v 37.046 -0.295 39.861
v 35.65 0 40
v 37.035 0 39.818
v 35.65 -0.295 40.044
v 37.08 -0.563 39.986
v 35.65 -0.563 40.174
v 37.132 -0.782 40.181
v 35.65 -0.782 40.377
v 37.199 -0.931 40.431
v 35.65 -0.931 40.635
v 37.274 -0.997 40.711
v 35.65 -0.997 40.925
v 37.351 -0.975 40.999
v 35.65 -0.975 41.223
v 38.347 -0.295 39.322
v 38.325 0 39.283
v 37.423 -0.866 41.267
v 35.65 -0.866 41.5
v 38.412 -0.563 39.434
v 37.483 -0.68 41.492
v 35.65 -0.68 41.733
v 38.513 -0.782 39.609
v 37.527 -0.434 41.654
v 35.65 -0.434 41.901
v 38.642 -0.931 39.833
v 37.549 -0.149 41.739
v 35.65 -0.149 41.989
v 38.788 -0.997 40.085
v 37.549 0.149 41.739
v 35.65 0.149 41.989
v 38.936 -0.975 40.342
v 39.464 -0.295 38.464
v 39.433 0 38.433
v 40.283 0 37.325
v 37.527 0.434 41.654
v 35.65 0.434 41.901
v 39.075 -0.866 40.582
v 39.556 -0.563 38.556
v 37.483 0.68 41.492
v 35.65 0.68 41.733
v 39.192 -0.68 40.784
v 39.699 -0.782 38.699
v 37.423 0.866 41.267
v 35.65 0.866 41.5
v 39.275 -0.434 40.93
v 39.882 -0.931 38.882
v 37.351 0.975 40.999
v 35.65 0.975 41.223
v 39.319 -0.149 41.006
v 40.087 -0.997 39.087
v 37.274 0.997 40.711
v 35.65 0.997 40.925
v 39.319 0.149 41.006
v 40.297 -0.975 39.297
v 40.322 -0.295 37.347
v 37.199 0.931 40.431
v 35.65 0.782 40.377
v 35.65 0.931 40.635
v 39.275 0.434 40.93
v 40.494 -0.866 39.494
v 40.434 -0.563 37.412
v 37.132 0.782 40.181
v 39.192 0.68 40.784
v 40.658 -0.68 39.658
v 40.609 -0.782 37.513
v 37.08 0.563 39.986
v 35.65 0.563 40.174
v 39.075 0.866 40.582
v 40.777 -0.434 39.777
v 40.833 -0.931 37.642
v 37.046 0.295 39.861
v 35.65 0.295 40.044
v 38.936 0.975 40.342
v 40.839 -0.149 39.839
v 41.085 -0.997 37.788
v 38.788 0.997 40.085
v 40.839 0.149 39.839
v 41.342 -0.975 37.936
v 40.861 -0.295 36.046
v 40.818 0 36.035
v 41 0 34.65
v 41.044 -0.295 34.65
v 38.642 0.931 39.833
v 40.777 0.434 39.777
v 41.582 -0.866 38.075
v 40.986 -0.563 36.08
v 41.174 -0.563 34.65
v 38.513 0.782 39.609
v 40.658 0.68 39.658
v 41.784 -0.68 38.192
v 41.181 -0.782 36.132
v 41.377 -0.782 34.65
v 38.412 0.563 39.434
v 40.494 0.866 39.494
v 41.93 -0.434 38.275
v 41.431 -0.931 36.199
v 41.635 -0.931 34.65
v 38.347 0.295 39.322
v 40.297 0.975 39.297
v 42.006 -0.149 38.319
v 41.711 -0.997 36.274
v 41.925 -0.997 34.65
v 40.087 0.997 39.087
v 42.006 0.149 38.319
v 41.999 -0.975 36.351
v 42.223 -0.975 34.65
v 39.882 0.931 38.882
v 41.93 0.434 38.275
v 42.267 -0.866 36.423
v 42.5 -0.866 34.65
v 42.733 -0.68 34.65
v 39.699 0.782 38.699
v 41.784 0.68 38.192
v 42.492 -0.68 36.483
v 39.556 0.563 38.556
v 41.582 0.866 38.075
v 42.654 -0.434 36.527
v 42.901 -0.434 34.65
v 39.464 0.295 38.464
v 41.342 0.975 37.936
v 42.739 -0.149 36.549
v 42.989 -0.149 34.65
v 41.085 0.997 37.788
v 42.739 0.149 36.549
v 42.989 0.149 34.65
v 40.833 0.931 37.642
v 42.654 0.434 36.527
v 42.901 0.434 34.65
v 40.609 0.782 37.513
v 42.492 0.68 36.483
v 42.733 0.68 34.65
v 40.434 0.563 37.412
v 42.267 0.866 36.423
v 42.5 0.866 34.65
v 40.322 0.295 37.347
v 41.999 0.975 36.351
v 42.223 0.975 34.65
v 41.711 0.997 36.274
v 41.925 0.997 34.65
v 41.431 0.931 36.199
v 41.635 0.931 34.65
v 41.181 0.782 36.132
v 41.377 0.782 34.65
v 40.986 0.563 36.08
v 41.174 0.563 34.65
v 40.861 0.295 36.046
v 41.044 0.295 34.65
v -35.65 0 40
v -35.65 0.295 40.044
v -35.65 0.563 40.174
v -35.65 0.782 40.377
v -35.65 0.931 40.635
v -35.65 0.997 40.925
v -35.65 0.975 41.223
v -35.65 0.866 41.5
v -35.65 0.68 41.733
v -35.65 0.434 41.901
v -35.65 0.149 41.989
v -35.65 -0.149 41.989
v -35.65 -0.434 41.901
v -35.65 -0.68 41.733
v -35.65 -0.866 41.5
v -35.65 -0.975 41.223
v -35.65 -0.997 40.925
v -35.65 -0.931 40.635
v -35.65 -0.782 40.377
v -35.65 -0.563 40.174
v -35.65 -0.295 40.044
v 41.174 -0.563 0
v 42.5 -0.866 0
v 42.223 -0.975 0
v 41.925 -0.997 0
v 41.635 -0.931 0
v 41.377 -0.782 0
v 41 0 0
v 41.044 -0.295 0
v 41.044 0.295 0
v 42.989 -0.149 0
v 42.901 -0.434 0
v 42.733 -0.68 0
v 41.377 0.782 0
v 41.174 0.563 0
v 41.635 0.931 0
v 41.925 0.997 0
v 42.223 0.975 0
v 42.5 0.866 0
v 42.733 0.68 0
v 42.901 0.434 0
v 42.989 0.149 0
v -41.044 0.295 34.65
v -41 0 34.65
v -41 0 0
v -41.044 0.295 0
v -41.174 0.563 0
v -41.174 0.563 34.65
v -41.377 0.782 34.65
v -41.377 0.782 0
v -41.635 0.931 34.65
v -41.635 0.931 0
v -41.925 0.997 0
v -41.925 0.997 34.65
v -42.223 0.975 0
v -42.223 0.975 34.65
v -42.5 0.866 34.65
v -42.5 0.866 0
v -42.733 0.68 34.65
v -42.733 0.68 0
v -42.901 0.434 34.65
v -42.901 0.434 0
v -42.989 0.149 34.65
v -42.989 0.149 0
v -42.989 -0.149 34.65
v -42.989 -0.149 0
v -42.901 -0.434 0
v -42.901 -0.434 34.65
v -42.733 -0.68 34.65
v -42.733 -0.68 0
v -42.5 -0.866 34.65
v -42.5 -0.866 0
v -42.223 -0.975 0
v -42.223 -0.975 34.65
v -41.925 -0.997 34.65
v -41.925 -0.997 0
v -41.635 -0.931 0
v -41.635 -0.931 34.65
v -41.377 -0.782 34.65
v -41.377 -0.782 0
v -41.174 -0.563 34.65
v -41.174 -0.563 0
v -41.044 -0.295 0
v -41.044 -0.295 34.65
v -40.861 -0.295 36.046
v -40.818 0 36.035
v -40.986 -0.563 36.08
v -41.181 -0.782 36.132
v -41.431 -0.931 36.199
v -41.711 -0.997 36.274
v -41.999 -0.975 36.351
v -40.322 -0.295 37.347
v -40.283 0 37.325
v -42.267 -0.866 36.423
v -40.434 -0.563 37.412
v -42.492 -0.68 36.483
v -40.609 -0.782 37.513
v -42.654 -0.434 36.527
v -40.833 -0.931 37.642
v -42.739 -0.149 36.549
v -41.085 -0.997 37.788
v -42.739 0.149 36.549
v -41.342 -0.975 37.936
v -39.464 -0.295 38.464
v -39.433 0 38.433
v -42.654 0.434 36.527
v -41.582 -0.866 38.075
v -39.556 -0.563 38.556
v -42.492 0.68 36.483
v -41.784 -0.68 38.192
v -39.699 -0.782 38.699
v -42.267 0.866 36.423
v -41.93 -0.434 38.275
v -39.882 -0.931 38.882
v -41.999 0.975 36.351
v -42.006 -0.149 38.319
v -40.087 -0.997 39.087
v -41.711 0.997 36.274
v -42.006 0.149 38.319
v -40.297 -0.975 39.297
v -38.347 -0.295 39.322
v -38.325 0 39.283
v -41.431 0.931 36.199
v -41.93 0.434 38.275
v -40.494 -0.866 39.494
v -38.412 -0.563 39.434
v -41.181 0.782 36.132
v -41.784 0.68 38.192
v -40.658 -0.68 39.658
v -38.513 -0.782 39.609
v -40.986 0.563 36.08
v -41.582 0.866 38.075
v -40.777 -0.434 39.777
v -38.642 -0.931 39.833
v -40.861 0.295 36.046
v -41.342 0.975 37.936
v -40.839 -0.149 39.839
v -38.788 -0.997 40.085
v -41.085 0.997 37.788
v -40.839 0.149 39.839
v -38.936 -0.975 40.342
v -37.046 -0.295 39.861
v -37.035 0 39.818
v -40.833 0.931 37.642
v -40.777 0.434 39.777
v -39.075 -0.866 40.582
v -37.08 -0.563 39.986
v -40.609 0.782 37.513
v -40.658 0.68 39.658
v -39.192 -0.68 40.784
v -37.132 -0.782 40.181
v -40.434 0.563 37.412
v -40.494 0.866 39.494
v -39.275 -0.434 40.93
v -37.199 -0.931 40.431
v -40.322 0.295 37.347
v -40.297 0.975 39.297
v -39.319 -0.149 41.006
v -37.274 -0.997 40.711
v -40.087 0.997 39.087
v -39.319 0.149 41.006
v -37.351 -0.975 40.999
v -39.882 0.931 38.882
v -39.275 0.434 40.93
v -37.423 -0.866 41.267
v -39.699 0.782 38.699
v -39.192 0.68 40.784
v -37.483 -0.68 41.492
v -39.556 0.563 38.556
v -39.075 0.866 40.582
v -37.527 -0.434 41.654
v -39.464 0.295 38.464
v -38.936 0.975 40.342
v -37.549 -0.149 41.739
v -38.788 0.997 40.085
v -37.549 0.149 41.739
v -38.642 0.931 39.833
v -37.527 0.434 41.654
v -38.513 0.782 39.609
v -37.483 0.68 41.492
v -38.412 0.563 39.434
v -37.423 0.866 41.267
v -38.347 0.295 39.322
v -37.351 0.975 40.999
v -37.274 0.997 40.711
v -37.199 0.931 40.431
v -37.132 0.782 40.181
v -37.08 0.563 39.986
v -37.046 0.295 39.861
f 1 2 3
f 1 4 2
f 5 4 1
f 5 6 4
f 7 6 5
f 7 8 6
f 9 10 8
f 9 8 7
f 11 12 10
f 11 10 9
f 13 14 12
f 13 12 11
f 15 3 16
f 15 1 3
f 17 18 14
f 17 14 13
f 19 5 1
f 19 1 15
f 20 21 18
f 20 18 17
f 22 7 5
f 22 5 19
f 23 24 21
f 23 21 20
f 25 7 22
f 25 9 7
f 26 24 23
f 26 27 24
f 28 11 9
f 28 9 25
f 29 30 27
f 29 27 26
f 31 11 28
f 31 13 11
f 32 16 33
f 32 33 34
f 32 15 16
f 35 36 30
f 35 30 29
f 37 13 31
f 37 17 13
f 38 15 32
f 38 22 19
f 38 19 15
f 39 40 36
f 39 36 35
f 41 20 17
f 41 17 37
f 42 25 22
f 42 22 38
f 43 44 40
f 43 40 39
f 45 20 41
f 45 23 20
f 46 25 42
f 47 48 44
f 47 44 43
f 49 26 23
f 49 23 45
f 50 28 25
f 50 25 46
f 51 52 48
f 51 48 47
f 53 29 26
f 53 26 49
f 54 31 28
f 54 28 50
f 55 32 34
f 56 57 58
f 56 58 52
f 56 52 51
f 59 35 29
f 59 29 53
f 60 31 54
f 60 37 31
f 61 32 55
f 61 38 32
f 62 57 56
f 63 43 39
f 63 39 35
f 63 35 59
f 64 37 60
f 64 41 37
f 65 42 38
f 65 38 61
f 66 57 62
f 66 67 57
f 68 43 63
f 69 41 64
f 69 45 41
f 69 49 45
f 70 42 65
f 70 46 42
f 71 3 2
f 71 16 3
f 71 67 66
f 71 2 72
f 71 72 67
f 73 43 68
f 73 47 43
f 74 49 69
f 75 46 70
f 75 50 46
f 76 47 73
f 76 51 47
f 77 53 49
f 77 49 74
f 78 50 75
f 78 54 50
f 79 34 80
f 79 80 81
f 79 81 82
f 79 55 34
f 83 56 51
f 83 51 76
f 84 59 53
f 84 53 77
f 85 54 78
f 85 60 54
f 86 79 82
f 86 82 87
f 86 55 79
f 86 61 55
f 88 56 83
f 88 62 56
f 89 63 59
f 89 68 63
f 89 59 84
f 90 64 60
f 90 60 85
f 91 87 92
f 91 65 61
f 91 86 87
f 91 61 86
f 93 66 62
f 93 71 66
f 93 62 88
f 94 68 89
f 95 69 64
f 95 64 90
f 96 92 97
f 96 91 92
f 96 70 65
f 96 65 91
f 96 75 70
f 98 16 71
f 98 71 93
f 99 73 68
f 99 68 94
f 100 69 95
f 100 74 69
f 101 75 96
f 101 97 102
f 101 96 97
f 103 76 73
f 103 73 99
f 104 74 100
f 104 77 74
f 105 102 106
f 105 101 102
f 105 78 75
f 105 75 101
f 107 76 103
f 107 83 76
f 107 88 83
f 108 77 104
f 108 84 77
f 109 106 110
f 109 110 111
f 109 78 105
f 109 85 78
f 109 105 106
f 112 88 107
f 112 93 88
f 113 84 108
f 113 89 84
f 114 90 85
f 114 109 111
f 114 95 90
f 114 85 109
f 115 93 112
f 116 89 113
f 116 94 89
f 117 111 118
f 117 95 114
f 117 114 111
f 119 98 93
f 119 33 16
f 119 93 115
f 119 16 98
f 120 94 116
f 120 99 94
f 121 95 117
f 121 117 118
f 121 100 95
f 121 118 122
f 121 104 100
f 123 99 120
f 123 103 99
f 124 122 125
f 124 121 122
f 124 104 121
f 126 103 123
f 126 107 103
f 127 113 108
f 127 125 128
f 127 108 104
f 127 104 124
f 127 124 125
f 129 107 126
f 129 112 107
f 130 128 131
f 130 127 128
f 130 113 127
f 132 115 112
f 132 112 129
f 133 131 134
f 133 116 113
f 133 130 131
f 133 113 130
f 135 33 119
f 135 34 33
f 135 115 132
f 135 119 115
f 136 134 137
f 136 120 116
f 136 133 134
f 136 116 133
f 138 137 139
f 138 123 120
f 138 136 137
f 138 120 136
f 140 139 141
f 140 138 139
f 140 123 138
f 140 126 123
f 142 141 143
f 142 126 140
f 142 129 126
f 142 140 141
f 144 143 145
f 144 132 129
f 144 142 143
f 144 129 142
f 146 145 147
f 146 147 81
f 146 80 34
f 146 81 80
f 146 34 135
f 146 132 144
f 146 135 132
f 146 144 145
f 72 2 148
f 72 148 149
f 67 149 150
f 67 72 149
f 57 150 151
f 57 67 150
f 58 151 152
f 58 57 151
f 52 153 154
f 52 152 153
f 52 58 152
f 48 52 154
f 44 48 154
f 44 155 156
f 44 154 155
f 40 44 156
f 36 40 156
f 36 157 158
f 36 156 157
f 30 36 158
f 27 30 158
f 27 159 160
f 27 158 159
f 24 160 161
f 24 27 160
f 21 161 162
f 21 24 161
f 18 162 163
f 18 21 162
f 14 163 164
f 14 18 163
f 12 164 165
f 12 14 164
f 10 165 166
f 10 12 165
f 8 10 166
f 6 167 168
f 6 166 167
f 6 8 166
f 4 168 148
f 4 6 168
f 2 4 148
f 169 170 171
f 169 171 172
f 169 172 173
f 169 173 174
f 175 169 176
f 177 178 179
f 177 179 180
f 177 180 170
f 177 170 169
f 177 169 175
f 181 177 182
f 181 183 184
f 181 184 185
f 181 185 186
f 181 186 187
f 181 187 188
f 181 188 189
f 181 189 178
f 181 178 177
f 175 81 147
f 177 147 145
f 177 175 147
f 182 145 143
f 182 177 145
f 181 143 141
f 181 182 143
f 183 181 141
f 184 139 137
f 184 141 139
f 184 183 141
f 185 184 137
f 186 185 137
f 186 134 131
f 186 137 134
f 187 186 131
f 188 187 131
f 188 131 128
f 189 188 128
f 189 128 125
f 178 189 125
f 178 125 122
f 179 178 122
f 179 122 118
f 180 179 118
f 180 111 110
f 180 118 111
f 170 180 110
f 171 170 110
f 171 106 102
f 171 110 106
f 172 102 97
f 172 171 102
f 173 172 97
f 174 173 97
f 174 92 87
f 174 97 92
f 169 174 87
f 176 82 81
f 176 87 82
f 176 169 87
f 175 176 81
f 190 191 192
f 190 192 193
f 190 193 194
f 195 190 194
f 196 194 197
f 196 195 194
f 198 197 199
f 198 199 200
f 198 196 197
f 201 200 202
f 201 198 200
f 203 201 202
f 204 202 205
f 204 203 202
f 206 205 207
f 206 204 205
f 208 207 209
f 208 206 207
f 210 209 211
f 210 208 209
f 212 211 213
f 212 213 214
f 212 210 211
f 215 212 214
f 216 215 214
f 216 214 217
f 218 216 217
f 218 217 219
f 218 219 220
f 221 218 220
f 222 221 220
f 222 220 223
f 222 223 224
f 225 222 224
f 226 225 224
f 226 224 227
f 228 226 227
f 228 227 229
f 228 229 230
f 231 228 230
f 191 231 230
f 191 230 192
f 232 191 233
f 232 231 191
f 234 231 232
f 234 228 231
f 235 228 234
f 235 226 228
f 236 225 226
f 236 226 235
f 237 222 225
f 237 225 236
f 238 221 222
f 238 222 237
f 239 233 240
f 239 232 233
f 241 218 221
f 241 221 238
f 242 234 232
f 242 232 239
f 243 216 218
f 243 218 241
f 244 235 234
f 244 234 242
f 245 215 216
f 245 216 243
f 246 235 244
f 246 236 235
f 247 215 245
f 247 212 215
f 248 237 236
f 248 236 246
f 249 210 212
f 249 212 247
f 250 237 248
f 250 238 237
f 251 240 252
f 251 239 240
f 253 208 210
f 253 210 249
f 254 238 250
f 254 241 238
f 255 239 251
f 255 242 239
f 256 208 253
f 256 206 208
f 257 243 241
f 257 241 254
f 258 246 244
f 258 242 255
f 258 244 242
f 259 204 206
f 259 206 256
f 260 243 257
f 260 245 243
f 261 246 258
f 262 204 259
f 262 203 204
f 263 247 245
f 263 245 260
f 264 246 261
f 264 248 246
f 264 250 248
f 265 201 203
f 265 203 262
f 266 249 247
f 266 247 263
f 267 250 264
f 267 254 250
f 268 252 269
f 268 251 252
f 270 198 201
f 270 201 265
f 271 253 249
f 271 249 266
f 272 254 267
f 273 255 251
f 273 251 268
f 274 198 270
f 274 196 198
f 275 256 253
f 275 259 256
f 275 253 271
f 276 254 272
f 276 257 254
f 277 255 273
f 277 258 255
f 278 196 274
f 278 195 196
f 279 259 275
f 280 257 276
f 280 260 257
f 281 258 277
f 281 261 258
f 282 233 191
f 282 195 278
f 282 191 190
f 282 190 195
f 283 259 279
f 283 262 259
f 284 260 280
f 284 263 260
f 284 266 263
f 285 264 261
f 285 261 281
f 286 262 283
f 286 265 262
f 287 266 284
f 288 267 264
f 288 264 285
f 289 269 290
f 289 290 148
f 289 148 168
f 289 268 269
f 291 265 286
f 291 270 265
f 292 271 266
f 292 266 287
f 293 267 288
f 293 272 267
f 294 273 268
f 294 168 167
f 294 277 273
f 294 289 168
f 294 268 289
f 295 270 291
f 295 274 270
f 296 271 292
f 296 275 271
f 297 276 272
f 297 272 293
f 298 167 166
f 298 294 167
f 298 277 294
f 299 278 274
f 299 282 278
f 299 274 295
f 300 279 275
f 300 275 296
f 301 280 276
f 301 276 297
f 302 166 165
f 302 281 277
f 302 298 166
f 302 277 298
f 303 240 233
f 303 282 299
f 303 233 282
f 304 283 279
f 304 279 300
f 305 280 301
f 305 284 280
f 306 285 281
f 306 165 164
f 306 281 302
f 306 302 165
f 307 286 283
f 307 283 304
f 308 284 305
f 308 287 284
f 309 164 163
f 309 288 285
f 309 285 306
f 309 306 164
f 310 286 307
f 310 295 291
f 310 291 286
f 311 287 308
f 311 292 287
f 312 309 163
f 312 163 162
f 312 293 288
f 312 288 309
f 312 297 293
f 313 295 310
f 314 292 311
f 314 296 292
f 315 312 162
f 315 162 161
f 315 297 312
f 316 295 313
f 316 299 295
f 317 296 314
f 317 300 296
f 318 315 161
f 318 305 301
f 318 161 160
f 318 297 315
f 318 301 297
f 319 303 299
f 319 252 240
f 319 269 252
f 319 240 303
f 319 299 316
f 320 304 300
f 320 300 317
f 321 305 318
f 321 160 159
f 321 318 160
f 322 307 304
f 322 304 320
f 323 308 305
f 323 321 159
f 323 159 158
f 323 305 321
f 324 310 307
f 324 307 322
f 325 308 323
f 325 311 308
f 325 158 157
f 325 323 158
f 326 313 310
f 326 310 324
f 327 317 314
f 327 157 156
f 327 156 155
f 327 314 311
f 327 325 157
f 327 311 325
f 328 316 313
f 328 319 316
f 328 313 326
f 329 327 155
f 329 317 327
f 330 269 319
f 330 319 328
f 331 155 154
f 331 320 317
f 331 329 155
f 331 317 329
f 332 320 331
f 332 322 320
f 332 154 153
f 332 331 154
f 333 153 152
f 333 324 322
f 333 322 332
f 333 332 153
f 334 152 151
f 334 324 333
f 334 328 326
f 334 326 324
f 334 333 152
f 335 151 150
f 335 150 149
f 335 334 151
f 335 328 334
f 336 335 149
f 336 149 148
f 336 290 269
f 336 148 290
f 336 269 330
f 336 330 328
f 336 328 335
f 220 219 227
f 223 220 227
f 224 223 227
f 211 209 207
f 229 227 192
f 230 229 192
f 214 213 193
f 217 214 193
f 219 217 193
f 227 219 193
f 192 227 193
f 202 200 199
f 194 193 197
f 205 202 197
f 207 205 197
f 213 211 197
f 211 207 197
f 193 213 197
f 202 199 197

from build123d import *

# Parameters (mm, degrees)
F1_R = 1


with BuildPart() as f2:
    # F2: sweep along a path in F0
    with BuildLine(Plane.XZ) as f2_path:
        Line((-42, 0), (-42, 34.65))
        ThreePointArc((-42, 34.65), (-40.140128, 39.140128), (-35.65, 41))
        Line((-35.65, 41), (0, 41))
        Line((0, 41), (35.65, 41))
        ThreePointArc((35.65, 41), (40.140128, 39.140128), (42, 34.65))
        Line((42, 34.65), (42, 0))
    # F1 (on Top) → F2 (sweep)
    with BuildSketch(Plane.XY):
        with Locations((-42, 0)):
            Circle(F1_R)
    sweep(path=f2_path.line)


solid = f2.part
